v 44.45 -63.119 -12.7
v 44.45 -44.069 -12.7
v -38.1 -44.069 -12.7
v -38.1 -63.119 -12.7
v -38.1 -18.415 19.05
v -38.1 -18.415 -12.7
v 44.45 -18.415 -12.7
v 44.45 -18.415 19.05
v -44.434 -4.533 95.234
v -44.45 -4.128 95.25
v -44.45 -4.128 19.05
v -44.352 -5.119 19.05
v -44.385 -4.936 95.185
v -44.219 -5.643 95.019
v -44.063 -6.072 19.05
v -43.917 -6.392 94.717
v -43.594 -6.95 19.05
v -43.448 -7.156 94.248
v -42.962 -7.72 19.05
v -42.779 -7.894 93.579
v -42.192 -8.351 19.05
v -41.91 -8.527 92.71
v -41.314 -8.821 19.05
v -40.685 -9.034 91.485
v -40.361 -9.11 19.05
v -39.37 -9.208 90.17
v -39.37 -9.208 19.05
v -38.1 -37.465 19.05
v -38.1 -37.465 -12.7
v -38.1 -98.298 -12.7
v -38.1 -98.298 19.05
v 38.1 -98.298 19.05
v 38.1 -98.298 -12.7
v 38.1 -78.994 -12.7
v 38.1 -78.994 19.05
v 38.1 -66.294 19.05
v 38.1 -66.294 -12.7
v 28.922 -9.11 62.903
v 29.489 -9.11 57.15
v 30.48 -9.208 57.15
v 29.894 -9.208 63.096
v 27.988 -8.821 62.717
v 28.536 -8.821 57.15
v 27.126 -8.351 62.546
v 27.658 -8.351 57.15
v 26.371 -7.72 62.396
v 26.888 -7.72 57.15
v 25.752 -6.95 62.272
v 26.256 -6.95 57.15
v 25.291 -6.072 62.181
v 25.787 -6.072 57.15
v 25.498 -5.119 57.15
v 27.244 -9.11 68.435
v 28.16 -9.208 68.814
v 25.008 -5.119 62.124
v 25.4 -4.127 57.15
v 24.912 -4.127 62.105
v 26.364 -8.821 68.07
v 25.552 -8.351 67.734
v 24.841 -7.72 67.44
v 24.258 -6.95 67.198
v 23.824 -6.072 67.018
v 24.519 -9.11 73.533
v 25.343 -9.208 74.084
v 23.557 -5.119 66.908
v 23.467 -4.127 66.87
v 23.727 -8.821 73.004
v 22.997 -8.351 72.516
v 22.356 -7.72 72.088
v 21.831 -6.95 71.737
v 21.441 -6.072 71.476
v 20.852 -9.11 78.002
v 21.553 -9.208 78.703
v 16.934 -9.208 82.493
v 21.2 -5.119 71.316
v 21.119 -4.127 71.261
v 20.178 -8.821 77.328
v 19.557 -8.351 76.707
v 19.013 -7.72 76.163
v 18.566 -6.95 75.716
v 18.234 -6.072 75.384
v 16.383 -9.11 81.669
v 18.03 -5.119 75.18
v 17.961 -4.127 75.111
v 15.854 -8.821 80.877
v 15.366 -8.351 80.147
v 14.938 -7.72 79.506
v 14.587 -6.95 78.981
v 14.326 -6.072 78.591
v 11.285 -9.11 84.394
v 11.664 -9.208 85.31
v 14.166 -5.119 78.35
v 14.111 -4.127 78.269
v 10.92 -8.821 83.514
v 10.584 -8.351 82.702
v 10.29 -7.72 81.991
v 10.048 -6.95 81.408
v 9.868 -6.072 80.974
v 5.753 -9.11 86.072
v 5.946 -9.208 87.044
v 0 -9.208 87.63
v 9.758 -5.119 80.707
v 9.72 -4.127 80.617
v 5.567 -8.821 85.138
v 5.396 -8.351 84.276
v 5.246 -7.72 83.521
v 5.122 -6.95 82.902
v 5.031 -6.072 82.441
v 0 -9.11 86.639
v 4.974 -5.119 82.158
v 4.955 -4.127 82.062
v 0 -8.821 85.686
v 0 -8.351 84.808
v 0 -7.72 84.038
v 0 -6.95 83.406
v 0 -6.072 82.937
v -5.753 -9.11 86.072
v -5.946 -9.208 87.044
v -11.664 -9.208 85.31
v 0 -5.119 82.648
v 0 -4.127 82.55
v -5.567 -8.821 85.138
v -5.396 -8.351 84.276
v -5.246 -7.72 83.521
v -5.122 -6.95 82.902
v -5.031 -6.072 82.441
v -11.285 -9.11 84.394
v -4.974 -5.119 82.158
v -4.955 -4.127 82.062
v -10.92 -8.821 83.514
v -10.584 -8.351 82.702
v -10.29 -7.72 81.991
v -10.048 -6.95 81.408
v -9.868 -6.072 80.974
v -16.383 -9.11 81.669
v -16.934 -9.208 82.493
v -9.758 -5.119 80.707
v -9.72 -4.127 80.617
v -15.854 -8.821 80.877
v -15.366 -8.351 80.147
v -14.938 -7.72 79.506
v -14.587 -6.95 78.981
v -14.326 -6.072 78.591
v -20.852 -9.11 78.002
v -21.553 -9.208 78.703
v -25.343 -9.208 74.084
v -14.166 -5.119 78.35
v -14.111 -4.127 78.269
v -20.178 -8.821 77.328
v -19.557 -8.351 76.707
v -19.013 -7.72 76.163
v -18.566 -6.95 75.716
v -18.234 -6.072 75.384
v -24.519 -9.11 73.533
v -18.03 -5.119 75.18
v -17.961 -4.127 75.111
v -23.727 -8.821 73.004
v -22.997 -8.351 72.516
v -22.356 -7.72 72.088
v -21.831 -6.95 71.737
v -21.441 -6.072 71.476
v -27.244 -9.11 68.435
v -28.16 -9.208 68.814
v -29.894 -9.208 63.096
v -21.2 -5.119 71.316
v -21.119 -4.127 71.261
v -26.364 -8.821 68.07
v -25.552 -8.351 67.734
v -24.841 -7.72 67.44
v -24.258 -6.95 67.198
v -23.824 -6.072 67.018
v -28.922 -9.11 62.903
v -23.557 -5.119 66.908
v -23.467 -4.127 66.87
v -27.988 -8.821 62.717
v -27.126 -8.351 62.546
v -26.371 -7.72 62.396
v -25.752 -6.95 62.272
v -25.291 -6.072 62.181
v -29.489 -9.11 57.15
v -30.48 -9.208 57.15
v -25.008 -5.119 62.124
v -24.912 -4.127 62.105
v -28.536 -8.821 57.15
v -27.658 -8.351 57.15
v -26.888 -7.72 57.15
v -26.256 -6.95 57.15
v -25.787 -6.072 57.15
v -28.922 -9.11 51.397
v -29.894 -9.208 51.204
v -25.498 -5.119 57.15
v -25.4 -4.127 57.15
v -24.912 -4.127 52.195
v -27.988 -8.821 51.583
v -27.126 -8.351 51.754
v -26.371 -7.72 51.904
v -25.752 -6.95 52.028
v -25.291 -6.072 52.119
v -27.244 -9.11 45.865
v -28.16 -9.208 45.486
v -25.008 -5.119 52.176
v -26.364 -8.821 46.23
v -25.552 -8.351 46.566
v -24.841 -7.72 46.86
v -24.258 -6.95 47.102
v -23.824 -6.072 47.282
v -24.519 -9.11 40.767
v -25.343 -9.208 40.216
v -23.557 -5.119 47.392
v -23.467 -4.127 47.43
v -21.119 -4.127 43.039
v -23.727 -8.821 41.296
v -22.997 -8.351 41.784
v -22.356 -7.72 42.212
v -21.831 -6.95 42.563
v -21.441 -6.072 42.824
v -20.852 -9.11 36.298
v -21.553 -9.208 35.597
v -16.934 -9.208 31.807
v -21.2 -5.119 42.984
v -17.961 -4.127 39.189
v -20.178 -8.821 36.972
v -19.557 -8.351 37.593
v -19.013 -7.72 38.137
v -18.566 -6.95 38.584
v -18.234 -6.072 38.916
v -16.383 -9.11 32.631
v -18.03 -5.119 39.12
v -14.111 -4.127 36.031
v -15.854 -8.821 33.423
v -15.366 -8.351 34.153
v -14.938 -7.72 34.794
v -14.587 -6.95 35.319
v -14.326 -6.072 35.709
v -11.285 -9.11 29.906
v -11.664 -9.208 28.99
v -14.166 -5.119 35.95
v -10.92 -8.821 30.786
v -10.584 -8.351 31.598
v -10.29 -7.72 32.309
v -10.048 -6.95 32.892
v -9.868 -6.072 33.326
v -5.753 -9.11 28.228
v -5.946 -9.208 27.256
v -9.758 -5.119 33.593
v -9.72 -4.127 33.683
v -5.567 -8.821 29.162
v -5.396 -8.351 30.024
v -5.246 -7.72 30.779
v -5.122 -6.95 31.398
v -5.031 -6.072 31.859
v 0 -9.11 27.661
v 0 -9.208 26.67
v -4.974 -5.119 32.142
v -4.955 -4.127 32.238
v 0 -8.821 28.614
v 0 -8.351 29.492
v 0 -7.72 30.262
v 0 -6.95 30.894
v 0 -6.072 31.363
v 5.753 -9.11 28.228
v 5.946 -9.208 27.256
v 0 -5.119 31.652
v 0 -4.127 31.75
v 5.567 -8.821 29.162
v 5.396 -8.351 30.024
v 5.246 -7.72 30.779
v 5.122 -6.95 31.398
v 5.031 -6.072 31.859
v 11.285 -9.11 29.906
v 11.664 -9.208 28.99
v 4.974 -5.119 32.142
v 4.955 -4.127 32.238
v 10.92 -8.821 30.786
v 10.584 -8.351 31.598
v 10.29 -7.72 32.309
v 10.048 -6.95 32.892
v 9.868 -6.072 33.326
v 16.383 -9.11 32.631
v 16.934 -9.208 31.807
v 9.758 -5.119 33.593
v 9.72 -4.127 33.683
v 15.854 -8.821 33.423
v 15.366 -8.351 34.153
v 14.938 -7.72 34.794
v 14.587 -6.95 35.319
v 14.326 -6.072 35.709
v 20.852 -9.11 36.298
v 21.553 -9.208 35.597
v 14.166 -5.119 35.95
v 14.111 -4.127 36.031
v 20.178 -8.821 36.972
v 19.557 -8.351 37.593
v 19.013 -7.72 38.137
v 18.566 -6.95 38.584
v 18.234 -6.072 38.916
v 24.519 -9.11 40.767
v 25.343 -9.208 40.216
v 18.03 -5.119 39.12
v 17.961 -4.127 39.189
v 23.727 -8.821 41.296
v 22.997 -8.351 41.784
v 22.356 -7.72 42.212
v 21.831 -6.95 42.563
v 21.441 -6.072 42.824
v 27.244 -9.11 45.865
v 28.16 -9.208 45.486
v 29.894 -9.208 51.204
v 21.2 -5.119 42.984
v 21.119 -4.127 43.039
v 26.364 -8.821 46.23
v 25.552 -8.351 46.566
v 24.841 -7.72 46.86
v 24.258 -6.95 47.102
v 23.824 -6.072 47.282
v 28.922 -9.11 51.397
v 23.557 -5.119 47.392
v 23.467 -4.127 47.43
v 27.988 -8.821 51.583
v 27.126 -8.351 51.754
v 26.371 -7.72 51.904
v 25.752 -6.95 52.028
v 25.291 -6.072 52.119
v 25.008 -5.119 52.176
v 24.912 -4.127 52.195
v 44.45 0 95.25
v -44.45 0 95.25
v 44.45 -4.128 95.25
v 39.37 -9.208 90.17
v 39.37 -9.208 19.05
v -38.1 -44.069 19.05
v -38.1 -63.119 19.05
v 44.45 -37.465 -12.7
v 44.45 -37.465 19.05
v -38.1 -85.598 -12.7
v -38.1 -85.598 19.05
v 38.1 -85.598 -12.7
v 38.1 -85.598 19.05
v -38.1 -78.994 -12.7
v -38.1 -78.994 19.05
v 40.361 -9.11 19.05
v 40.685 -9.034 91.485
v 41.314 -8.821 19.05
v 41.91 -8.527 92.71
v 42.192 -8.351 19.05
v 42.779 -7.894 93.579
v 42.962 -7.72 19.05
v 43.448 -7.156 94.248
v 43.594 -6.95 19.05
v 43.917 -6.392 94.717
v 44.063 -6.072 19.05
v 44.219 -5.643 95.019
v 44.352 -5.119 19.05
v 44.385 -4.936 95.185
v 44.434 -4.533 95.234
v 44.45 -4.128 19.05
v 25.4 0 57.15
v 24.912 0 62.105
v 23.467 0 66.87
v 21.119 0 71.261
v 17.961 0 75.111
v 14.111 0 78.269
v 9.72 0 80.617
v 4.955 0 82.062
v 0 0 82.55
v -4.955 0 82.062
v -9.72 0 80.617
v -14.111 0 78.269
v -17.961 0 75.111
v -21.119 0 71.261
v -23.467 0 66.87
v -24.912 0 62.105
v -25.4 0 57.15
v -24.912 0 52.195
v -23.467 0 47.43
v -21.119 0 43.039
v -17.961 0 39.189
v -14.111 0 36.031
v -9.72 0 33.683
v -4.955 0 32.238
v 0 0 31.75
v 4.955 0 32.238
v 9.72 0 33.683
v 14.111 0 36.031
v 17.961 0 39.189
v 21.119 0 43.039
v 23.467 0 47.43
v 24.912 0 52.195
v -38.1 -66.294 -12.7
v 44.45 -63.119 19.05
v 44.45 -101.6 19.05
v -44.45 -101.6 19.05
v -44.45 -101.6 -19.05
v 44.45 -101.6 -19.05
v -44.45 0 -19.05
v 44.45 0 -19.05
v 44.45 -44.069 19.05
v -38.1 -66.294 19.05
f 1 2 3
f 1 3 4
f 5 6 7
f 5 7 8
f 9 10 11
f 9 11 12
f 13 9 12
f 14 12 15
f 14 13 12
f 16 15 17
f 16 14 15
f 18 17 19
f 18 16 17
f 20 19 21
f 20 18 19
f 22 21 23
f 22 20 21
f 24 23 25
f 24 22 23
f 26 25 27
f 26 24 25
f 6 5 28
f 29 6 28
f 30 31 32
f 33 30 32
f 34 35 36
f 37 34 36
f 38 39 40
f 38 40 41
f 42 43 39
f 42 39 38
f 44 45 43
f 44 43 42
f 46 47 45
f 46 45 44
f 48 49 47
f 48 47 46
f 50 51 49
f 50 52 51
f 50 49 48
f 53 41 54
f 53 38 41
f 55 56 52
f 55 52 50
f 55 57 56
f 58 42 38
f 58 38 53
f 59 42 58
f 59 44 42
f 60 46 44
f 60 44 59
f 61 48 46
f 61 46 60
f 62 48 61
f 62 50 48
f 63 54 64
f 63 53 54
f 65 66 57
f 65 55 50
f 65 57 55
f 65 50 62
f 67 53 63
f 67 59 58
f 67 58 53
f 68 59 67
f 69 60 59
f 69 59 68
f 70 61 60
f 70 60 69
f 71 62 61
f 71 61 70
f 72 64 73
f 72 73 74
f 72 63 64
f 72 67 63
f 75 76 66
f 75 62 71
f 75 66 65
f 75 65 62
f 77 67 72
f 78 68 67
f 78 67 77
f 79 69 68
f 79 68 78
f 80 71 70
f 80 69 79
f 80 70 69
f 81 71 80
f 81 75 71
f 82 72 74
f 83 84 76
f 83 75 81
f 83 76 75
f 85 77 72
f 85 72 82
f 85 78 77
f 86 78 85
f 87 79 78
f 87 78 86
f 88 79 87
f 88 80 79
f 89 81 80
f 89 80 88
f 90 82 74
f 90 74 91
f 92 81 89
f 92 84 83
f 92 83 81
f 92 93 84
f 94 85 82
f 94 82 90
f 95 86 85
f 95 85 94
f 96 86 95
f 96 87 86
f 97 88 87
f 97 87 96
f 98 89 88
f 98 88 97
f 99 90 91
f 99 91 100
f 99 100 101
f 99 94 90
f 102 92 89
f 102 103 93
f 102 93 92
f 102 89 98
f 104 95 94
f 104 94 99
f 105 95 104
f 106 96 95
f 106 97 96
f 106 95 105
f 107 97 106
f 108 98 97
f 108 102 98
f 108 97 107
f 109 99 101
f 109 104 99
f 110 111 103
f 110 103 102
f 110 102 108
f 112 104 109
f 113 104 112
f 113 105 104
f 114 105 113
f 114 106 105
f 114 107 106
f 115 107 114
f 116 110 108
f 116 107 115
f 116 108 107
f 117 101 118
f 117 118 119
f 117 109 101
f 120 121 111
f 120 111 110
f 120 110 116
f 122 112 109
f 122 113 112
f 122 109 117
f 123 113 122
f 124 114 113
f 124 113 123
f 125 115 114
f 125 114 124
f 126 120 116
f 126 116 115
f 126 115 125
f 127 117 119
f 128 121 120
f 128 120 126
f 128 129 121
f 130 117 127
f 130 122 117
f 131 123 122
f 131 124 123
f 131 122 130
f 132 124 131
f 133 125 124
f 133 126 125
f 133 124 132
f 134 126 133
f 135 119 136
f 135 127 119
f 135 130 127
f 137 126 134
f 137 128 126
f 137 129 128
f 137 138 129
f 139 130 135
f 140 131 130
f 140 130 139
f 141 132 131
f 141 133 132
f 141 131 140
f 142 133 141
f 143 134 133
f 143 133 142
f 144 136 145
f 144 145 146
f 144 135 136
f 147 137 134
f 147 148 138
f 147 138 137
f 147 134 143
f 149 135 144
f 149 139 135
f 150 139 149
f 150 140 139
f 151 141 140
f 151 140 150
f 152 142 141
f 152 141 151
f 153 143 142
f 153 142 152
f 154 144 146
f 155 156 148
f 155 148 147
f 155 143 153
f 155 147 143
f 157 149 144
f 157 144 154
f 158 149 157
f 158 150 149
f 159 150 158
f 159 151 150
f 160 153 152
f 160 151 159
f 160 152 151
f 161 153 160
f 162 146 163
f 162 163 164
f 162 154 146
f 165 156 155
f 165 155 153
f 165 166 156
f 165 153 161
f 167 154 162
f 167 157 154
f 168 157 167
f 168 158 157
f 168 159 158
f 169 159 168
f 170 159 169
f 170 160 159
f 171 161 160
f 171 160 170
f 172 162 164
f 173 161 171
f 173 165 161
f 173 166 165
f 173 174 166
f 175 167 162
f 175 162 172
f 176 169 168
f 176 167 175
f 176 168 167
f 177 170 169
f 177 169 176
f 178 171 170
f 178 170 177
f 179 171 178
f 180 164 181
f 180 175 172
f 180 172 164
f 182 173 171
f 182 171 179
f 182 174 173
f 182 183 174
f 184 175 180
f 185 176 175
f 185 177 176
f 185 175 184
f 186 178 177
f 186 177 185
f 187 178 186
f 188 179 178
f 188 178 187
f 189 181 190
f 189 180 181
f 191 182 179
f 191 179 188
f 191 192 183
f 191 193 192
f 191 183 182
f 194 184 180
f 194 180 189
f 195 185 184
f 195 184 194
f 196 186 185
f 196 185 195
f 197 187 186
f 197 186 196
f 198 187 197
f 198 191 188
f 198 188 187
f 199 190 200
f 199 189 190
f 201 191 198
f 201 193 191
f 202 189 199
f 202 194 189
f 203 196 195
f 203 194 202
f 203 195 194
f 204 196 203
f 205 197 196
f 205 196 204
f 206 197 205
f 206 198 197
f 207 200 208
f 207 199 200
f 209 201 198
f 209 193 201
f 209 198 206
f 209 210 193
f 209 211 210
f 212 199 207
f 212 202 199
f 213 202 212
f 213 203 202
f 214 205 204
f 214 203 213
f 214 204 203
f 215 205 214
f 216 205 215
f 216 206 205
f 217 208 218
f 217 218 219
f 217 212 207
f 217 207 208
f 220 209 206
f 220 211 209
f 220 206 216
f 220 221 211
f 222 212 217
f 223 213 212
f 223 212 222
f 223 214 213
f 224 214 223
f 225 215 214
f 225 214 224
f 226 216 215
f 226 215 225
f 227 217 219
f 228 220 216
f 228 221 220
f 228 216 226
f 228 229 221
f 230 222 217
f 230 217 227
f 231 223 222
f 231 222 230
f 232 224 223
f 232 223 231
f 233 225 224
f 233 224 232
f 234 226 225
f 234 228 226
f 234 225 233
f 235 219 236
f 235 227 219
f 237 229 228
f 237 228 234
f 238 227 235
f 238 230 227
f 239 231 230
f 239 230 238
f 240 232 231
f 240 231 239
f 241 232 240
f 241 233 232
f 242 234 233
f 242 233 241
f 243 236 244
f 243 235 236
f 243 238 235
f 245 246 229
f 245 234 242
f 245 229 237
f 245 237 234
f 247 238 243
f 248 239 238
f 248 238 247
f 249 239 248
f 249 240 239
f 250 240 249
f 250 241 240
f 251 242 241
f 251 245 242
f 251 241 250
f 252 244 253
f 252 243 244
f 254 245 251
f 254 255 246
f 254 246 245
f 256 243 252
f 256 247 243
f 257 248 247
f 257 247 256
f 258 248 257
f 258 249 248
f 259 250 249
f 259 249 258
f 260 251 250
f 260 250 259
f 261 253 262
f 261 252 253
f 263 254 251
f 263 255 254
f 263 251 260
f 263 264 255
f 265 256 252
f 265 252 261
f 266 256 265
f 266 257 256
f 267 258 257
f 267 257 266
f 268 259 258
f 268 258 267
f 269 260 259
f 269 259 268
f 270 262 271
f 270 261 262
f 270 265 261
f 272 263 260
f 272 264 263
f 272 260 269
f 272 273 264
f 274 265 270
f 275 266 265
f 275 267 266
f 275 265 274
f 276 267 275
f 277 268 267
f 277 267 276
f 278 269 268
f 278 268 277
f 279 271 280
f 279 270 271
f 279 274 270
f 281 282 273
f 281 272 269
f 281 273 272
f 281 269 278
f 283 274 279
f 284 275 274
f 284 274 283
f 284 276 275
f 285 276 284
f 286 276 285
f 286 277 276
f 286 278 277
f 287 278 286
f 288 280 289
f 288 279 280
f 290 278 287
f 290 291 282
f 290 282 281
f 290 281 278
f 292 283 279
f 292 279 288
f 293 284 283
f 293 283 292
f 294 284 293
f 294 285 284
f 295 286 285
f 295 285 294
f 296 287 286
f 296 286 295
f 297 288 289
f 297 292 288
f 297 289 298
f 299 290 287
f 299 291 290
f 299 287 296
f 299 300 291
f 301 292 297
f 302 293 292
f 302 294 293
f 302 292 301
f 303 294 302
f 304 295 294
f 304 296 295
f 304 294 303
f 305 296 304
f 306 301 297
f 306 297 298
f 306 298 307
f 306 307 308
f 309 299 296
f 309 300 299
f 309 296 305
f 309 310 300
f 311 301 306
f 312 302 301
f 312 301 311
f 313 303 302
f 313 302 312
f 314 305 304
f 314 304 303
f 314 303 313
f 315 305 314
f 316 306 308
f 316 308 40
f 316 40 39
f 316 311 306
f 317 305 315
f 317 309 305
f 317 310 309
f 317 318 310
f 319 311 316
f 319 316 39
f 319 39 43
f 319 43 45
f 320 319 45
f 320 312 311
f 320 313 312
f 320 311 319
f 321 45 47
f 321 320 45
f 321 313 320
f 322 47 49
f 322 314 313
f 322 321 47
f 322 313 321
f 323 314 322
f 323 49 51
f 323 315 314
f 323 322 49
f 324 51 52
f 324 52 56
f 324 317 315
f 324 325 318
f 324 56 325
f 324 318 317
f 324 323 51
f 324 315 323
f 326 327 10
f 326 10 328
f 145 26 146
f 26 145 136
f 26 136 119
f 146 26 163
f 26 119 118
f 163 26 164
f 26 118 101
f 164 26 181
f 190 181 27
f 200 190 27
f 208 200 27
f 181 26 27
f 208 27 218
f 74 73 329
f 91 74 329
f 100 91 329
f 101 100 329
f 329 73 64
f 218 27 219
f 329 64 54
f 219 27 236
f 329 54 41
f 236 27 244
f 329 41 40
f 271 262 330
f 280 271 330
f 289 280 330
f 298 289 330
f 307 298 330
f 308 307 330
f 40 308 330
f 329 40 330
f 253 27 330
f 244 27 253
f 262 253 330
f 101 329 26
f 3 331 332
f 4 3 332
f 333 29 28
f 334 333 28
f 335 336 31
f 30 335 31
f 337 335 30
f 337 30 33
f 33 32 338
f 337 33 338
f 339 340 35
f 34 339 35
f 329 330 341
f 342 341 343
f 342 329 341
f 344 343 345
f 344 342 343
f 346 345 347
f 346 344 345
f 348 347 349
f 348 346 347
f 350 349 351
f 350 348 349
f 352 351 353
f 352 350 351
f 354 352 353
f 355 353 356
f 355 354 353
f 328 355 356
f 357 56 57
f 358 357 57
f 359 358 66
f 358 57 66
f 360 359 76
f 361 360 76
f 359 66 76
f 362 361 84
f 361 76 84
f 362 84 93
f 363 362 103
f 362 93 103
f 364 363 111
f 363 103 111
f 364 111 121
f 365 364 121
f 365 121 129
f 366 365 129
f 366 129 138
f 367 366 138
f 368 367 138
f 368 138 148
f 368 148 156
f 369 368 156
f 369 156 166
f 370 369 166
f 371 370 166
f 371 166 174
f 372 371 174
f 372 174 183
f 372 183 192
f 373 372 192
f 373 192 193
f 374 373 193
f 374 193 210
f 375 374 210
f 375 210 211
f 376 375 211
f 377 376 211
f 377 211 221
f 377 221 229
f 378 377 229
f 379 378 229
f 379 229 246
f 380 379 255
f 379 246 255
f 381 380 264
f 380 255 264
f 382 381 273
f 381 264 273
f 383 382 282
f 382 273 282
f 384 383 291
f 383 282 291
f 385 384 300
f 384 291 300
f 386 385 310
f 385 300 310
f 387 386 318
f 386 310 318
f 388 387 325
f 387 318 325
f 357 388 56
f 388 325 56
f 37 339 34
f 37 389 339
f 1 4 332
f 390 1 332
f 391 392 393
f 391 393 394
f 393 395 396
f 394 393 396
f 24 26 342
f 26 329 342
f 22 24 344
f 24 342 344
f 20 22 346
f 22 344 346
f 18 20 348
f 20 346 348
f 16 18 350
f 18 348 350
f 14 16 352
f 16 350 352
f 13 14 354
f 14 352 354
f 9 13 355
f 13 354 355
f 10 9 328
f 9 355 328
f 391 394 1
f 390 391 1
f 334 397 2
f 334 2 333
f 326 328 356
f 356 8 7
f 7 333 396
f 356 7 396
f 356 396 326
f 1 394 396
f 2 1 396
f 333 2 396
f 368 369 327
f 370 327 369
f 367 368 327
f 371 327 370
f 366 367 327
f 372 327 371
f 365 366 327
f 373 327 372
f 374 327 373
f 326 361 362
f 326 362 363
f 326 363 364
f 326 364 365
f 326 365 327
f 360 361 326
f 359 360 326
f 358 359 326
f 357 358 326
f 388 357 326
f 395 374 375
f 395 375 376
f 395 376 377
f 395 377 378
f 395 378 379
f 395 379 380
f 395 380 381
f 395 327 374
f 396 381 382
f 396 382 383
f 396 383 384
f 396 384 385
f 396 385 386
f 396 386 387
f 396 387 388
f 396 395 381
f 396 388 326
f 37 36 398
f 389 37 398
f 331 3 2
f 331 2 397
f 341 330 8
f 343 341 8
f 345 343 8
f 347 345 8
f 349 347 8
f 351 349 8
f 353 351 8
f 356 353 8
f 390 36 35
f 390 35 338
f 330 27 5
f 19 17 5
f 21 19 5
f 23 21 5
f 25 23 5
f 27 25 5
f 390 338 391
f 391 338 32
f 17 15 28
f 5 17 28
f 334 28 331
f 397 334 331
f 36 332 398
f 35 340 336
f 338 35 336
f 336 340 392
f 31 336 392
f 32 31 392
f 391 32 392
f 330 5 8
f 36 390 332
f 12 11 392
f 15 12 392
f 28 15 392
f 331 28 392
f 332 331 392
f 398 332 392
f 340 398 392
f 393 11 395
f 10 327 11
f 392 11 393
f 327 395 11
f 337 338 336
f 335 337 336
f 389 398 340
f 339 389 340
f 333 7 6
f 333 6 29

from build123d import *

# Parameters (mm, degrees)
F1_DEPTH  = 101.6
F3_DEPTH  = 31.75
F4_W      = 19.05
F4_H      = 31.75
F5_DEPTH  = 88.901
F6_W      = 88.9
F6_H      = 9.2075
F7_DEPTH  = 76.2
F8_W      = 19.05
F8_H      = 31.75
F9_DEPTH  = 6.35
F10_R     = 25.4
F11_DEPTH = 9.2085
F12_R     = 5.08


with BuildPart() as f1:
    # F0 (on Front) → F1 (new body)
    with BuildSketch(Plane.XZ):
        Polygon((44.45, 19.05), (0, 19.05), (-44.45, 19.05), (-44.45, 0), (-44.45, -19.05), (0, -19.05), (44.45, -19.05), (44.45, 0), align=None)
    extrude(amount=F1_DEPTH)

    # F2 (on face) → F3 (cut)
    with BuildSketch(Plane.XY.offset(19.05)):
        Polygon((38.1, -85.598), (0, -85.598), (-38.1, -85.598), (-38.1, -98.298), (0, -98.298), (38.1, -98.298), align=None)
        Polygon((-38.1, -78.994), (0, -78.994), (38.1, -78.994), (38.1, -66.294), (0, -66.294), (-38.1, -66.294), align=None)
    extrude(amount=-F3_DEPTH, mode=Mode.SUBTRACT)

    # F4 (on face) → F5 (cut, through all)
    with BuildSketch(Plane(origin=(-44.45, 0, 0), x_dir=(0, -1, 0), z_dir=(-1, 0, 0))):
        with Locations((53.594, 3.175)):
            Rectangle(F4_W, F4_H)
        with Locations((27.94, 3.175)):
            Rectangle(F4_W, F4_H)
    extrude(amount=-F5_DEPTH, mode=Mode.SUBTRACT)

    # F6 (on face) → F7 (join)
    with BuildSketch(Plane.XY.offset(19.05)):
        with Locations((0, -4.60375)):
            Rectangle(F6_W, F6_H)
    extrude(amount=F7_DEPTH)

    # F8 (on face) → F9 (join, through all)
    with BuildSketch(Plane(origin=(-44.45, 0, 0), x_dir=(0, -1, 0), z_dir=(-1, 0, 0))):
        with Locations((27.94, 3.175)):
            Rectangle(F8_W, F8_H)
        with Locations((53.594, 3.175)):
            Rectangle(F8_W, F8_H)
    extrude(amount=-F9_DEPTH)

    # F10 (on face) → F11 (cut, through all)
    with BuildSketch(Plane.XZ.offset(9.2075)):
        with Locations((0, 57.15)):
            Circle(F10_R)
    extrude(amount=-F11_DEPTH, mode=Mode.SUBTRACT)

    # F12
    f12_edges = [f1.edges().sort_by_distance(p)[0] for p in [
        (0, -9.2075, 95.25),
        (-44.45, -9.2075, 57.15),
        (44.45, -9.2075, 57.15),
        (-25.4, -9.2075, 57.15),
    ]]
    fillet(f12_edges, radius=F12_R)


solid = f1.part
